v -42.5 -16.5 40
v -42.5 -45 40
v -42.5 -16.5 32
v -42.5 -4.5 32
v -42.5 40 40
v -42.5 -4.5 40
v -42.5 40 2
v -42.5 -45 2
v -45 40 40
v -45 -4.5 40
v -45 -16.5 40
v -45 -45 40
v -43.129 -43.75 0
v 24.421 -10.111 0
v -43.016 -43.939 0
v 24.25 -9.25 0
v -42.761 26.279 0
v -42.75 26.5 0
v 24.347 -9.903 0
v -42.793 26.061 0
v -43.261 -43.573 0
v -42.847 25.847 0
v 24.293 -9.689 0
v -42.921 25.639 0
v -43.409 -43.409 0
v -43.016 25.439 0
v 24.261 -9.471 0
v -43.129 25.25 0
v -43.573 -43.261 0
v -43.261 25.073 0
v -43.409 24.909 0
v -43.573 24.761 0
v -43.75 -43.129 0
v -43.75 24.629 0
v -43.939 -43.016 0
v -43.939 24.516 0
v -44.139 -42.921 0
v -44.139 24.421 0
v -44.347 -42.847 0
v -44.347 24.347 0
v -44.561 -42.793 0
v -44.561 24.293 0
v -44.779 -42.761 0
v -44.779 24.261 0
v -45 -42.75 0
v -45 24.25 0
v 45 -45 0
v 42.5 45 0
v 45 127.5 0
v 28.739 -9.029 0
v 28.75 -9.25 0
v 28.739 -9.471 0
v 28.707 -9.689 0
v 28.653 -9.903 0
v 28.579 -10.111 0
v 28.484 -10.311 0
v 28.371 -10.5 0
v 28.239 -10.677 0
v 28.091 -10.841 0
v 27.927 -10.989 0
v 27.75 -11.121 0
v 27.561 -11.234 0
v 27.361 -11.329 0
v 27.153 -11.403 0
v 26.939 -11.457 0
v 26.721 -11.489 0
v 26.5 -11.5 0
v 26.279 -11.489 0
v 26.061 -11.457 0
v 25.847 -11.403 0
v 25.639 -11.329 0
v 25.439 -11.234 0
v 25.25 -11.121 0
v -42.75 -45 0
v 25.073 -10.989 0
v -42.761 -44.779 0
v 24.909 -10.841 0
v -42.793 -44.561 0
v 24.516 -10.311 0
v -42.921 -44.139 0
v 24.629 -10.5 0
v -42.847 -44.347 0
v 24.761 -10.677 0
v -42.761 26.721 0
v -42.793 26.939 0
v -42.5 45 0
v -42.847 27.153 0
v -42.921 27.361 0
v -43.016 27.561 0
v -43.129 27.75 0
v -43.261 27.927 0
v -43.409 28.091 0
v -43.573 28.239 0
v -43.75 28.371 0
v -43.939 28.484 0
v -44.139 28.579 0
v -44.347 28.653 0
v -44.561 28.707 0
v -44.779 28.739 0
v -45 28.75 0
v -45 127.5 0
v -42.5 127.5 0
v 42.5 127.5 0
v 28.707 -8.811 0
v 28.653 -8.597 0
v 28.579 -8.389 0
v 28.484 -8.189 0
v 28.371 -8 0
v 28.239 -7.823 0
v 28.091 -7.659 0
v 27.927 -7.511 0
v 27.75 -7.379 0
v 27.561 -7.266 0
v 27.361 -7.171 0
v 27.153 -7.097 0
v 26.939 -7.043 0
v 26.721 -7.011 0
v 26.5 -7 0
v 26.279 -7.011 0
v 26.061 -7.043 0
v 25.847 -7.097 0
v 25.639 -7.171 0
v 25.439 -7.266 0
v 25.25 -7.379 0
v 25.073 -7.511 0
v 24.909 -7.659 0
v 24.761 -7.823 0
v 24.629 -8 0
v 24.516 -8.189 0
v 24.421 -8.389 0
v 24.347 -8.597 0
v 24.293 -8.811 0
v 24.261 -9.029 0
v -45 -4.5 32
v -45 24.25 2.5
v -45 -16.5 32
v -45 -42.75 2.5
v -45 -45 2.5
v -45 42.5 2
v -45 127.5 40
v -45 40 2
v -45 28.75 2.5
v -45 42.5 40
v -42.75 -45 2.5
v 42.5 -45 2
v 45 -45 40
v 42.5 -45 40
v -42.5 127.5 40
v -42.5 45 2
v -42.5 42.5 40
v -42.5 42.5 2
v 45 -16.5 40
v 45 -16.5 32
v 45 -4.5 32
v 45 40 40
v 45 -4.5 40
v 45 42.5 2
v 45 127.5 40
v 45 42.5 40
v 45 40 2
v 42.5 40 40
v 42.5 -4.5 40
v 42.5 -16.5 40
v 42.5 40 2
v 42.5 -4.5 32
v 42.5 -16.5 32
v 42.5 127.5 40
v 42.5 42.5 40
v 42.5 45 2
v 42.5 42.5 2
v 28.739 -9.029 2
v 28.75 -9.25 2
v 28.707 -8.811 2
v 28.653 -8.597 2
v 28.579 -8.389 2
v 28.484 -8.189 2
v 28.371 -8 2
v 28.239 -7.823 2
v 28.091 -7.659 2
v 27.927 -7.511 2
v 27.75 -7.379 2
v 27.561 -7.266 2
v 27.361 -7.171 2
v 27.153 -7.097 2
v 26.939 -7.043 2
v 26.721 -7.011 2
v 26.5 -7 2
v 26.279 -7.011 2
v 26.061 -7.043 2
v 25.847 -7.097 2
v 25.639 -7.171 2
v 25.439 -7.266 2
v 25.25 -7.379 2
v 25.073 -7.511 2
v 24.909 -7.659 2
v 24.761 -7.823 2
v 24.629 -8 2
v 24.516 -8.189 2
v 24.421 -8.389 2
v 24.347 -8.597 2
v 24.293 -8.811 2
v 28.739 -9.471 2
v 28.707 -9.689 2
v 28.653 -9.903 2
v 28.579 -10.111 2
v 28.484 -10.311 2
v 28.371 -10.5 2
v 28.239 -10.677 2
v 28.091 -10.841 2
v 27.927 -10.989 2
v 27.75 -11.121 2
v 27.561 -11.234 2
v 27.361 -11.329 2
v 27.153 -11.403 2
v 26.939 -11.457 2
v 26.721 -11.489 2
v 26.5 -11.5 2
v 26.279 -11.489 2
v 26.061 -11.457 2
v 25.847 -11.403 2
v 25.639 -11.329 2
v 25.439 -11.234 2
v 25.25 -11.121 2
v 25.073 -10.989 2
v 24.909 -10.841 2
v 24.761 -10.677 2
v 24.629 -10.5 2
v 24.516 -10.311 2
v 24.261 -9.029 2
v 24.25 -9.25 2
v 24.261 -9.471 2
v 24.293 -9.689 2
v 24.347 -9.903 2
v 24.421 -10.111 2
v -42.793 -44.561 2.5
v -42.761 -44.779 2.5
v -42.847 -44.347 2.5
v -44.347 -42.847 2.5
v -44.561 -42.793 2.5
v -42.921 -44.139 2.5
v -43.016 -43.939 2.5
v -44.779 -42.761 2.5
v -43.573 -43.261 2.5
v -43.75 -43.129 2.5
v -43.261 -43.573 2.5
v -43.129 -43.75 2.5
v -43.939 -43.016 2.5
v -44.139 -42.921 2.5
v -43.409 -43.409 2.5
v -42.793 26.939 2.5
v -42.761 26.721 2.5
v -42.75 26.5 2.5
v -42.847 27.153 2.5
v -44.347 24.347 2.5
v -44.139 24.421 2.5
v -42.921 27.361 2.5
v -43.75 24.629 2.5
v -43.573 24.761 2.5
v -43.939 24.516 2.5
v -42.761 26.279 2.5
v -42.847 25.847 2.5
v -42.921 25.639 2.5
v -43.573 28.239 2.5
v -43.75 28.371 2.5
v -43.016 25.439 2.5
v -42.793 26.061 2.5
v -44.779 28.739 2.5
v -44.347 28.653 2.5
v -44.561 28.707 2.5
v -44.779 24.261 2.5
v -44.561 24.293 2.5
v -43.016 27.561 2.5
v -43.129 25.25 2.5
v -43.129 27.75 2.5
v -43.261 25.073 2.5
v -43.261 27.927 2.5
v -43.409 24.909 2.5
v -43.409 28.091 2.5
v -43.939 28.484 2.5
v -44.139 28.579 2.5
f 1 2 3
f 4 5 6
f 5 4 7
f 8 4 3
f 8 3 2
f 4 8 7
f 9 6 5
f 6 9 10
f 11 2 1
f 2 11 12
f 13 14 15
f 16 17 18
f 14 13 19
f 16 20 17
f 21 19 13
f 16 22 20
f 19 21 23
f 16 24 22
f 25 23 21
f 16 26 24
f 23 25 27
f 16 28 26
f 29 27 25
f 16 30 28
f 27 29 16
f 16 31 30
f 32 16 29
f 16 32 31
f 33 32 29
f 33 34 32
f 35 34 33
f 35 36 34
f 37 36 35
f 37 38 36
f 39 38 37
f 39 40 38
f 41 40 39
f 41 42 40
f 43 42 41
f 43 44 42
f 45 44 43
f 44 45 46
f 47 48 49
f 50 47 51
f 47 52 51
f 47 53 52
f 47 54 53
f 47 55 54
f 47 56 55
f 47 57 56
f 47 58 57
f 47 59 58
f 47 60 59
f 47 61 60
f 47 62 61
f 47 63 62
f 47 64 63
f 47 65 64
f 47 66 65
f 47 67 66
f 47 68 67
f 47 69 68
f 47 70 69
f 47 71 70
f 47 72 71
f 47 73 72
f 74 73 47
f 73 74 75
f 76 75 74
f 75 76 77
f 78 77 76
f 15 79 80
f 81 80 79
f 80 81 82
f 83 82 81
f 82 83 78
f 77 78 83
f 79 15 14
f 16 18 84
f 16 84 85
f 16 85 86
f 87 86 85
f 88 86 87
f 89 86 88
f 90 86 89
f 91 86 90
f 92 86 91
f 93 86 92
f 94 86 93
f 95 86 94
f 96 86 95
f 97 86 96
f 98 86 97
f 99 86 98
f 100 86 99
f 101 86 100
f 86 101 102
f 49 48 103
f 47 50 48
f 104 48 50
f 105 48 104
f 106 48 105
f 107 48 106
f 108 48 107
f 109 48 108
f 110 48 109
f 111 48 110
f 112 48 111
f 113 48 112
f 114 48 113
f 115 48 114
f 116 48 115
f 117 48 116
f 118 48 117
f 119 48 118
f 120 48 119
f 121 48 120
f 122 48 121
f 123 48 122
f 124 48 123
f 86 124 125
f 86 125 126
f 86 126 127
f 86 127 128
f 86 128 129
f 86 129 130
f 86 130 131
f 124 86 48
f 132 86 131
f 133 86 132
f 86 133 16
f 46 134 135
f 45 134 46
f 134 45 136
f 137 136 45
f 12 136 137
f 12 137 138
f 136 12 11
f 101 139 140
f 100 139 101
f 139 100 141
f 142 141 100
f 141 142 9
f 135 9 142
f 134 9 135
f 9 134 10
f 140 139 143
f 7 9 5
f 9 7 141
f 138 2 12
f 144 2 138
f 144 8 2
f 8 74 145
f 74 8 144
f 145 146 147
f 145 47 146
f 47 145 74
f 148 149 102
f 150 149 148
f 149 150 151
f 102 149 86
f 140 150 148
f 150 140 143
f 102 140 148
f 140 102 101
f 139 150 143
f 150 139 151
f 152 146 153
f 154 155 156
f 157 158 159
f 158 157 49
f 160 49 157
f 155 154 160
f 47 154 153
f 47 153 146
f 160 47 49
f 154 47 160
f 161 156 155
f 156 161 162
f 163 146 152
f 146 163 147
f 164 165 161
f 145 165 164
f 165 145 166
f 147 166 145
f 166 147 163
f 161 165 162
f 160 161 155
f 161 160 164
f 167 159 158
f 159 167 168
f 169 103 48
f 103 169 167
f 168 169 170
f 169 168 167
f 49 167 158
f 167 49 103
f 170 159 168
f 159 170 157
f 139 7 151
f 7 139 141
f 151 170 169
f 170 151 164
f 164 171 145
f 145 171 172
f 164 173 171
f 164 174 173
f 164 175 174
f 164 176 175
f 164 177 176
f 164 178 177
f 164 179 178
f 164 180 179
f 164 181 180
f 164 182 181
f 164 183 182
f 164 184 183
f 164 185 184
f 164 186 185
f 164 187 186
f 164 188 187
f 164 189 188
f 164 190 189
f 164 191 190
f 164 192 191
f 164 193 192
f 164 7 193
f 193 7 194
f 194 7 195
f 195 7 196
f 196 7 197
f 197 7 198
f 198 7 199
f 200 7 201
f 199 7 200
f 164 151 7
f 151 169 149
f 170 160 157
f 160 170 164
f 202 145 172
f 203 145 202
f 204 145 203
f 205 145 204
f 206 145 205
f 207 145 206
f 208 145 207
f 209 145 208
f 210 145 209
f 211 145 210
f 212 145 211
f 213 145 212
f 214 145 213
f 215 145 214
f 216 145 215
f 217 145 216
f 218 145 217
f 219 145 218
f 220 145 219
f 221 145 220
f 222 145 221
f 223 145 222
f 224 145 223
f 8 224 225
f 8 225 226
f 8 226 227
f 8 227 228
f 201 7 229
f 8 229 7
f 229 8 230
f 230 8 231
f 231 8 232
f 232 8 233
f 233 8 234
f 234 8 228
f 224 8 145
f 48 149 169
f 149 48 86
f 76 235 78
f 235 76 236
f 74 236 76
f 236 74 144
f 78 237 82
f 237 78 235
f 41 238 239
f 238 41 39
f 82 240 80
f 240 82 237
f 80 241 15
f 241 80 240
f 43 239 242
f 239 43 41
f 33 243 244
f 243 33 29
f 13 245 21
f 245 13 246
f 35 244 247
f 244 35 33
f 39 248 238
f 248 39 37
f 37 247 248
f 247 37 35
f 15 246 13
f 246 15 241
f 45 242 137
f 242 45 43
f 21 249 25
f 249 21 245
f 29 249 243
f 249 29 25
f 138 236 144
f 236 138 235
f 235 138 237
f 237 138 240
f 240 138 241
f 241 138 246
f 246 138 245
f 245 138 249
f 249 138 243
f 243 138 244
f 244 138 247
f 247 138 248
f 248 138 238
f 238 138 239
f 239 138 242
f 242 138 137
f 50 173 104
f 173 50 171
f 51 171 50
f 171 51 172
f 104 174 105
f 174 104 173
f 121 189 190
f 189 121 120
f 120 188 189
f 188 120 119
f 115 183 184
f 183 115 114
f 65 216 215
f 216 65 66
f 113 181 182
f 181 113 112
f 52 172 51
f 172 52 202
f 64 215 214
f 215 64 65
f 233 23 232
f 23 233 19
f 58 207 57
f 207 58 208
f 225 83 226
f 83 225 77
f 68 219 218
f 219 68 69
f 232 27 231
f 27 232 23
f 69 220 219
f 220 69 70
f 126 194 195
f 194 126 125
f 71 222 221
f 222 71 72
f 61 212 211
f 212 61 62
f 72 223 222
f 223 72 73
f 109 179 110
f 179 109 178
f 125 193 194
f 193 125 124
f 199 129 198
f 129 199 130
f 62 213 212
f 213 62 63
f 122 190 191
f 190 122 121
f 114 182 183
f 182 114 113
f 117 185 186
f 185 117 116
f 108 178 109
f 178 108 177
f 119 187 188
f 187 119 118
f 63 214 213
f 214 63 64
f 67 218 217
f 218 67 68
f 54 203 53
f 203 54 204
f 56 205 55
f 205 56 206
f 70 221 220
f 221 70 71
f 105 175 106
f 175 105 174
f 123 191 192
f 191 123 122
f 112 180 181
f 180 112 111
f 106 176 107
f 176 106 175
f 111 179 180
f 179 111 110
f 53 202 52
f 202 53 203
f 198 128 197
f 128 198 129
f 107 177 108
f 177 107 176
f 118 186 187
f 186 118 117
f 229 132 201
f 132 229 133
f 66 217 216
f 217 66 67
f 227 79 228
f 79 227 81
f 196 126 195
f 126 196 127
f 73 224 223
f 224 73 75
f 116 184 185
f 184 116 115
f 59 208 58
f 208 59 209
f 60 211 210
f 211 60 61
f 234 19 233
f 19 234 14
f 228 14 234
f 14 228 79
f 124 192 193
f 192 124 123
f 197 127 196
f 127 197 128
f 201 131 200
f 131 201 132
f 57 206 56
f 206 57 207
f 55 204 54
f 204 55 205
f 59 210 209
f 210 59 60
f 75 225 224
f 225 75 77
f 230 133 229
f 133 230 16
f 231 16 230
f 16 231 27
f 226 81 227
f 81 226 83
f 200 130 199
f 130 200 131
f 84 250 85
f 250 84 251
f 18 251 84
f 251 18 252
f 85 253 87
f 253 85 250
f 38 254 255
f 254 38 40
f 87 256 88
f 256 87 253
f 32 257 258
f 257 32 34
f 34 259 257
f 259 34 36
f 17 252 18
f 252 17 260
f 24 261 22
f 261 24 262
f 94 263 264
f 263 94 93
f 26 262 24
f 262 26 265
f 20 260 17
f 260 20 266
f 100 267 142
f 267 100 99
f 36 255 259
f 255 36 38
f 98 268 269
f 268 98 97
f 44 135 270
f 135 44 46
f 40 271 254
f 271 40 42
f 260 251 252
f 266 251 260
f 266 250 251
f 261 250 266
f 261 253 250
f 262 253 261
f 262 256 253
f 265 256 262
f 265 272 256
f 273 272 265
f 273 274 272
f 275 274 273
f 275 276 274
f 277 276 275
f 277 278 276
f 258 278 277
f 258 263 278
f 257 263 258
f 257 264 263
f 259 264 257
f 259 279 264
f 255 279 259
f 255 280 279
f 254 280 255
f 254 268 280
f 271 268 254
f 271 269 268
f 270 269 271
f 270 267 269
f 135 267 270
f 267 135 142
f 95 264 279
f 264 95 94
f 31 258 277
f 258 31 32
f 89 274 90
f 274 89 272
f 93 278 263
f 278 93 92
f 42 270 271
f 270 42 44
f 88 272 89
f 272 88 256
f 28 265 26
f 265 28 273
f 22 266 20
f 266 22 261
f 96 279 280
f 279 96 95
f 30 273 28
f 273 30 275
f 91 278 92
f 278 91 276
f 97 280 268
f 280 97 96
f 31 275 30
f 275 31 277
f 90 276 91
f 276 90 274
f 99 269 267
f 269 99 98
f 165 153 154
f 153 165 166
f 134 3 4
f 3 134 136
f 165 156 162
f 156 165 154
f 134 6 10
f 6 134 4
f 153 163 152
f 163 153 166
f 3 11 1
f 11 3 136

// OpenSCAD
// Magnetic stirrer housing for 80 mm PC case fan
// Print orientation: top plate on bed (z = 0), walls build upward (+Z)

// ---------- Dimensions ----------
plate_t      = 2;     // top plate thickness
wall_t       = 2.5;   // wall thickness
box_h        = 40;    // outer wall height (open top)
outer_x      = 90;    // outer size in X
outer_y      = 90;    // outer size in Y
hole_d       = 4.5;   // M4 screw hole diameter
hole_pitch   = 71.5;  // square pattern centre-to-centre
notch_w      = 12;    // cable notch width
notch_depth  = 8;     // notch depth from open edge (z = 32 to 40)
eps          = 0.5;   // cutter overshoot past faces

$fn = 64;

// ---------- Model ----------
difference() {
    union() {
        // Top plate
        translate([-outer_x/2, -outer_y/2, 0])
            cube([outer_x, outer_y, plate_t]);

        // Four walls rising to z = box_h
        for (sx = [-1, 1], sy = [-1, 1])
            translate([sx > 0 ? outer_x/2 - wall_t : -outer_x/2,
                       sy > 0 ? outer_y/2 - wall_t : -outer_y/2,
                       0])
                cube([wall_t, outer_y - 2*wall_t, box_h]);
    }

    // Screw holes through top plate on 71.5 mm square pattern
    for (i = [0 : 3]) {
        a = (i % 2) * hole_pitch;
        b = (i / 2) * hole_pitch;
        translate([a - outer_x/2, b - outer_y/2, -eps])
            cylinder(d = hole_d, h = plate_t + 2*eps);
    }

    // Cable notch in one wall (z = 32 to 40, open edge down)
    translate([-outer_x/2, -outer_y/2/2 + notch_w/2, box_h - notch_depth])
        cube([outer_x, notch_w, notch_depth + eps]);
}
